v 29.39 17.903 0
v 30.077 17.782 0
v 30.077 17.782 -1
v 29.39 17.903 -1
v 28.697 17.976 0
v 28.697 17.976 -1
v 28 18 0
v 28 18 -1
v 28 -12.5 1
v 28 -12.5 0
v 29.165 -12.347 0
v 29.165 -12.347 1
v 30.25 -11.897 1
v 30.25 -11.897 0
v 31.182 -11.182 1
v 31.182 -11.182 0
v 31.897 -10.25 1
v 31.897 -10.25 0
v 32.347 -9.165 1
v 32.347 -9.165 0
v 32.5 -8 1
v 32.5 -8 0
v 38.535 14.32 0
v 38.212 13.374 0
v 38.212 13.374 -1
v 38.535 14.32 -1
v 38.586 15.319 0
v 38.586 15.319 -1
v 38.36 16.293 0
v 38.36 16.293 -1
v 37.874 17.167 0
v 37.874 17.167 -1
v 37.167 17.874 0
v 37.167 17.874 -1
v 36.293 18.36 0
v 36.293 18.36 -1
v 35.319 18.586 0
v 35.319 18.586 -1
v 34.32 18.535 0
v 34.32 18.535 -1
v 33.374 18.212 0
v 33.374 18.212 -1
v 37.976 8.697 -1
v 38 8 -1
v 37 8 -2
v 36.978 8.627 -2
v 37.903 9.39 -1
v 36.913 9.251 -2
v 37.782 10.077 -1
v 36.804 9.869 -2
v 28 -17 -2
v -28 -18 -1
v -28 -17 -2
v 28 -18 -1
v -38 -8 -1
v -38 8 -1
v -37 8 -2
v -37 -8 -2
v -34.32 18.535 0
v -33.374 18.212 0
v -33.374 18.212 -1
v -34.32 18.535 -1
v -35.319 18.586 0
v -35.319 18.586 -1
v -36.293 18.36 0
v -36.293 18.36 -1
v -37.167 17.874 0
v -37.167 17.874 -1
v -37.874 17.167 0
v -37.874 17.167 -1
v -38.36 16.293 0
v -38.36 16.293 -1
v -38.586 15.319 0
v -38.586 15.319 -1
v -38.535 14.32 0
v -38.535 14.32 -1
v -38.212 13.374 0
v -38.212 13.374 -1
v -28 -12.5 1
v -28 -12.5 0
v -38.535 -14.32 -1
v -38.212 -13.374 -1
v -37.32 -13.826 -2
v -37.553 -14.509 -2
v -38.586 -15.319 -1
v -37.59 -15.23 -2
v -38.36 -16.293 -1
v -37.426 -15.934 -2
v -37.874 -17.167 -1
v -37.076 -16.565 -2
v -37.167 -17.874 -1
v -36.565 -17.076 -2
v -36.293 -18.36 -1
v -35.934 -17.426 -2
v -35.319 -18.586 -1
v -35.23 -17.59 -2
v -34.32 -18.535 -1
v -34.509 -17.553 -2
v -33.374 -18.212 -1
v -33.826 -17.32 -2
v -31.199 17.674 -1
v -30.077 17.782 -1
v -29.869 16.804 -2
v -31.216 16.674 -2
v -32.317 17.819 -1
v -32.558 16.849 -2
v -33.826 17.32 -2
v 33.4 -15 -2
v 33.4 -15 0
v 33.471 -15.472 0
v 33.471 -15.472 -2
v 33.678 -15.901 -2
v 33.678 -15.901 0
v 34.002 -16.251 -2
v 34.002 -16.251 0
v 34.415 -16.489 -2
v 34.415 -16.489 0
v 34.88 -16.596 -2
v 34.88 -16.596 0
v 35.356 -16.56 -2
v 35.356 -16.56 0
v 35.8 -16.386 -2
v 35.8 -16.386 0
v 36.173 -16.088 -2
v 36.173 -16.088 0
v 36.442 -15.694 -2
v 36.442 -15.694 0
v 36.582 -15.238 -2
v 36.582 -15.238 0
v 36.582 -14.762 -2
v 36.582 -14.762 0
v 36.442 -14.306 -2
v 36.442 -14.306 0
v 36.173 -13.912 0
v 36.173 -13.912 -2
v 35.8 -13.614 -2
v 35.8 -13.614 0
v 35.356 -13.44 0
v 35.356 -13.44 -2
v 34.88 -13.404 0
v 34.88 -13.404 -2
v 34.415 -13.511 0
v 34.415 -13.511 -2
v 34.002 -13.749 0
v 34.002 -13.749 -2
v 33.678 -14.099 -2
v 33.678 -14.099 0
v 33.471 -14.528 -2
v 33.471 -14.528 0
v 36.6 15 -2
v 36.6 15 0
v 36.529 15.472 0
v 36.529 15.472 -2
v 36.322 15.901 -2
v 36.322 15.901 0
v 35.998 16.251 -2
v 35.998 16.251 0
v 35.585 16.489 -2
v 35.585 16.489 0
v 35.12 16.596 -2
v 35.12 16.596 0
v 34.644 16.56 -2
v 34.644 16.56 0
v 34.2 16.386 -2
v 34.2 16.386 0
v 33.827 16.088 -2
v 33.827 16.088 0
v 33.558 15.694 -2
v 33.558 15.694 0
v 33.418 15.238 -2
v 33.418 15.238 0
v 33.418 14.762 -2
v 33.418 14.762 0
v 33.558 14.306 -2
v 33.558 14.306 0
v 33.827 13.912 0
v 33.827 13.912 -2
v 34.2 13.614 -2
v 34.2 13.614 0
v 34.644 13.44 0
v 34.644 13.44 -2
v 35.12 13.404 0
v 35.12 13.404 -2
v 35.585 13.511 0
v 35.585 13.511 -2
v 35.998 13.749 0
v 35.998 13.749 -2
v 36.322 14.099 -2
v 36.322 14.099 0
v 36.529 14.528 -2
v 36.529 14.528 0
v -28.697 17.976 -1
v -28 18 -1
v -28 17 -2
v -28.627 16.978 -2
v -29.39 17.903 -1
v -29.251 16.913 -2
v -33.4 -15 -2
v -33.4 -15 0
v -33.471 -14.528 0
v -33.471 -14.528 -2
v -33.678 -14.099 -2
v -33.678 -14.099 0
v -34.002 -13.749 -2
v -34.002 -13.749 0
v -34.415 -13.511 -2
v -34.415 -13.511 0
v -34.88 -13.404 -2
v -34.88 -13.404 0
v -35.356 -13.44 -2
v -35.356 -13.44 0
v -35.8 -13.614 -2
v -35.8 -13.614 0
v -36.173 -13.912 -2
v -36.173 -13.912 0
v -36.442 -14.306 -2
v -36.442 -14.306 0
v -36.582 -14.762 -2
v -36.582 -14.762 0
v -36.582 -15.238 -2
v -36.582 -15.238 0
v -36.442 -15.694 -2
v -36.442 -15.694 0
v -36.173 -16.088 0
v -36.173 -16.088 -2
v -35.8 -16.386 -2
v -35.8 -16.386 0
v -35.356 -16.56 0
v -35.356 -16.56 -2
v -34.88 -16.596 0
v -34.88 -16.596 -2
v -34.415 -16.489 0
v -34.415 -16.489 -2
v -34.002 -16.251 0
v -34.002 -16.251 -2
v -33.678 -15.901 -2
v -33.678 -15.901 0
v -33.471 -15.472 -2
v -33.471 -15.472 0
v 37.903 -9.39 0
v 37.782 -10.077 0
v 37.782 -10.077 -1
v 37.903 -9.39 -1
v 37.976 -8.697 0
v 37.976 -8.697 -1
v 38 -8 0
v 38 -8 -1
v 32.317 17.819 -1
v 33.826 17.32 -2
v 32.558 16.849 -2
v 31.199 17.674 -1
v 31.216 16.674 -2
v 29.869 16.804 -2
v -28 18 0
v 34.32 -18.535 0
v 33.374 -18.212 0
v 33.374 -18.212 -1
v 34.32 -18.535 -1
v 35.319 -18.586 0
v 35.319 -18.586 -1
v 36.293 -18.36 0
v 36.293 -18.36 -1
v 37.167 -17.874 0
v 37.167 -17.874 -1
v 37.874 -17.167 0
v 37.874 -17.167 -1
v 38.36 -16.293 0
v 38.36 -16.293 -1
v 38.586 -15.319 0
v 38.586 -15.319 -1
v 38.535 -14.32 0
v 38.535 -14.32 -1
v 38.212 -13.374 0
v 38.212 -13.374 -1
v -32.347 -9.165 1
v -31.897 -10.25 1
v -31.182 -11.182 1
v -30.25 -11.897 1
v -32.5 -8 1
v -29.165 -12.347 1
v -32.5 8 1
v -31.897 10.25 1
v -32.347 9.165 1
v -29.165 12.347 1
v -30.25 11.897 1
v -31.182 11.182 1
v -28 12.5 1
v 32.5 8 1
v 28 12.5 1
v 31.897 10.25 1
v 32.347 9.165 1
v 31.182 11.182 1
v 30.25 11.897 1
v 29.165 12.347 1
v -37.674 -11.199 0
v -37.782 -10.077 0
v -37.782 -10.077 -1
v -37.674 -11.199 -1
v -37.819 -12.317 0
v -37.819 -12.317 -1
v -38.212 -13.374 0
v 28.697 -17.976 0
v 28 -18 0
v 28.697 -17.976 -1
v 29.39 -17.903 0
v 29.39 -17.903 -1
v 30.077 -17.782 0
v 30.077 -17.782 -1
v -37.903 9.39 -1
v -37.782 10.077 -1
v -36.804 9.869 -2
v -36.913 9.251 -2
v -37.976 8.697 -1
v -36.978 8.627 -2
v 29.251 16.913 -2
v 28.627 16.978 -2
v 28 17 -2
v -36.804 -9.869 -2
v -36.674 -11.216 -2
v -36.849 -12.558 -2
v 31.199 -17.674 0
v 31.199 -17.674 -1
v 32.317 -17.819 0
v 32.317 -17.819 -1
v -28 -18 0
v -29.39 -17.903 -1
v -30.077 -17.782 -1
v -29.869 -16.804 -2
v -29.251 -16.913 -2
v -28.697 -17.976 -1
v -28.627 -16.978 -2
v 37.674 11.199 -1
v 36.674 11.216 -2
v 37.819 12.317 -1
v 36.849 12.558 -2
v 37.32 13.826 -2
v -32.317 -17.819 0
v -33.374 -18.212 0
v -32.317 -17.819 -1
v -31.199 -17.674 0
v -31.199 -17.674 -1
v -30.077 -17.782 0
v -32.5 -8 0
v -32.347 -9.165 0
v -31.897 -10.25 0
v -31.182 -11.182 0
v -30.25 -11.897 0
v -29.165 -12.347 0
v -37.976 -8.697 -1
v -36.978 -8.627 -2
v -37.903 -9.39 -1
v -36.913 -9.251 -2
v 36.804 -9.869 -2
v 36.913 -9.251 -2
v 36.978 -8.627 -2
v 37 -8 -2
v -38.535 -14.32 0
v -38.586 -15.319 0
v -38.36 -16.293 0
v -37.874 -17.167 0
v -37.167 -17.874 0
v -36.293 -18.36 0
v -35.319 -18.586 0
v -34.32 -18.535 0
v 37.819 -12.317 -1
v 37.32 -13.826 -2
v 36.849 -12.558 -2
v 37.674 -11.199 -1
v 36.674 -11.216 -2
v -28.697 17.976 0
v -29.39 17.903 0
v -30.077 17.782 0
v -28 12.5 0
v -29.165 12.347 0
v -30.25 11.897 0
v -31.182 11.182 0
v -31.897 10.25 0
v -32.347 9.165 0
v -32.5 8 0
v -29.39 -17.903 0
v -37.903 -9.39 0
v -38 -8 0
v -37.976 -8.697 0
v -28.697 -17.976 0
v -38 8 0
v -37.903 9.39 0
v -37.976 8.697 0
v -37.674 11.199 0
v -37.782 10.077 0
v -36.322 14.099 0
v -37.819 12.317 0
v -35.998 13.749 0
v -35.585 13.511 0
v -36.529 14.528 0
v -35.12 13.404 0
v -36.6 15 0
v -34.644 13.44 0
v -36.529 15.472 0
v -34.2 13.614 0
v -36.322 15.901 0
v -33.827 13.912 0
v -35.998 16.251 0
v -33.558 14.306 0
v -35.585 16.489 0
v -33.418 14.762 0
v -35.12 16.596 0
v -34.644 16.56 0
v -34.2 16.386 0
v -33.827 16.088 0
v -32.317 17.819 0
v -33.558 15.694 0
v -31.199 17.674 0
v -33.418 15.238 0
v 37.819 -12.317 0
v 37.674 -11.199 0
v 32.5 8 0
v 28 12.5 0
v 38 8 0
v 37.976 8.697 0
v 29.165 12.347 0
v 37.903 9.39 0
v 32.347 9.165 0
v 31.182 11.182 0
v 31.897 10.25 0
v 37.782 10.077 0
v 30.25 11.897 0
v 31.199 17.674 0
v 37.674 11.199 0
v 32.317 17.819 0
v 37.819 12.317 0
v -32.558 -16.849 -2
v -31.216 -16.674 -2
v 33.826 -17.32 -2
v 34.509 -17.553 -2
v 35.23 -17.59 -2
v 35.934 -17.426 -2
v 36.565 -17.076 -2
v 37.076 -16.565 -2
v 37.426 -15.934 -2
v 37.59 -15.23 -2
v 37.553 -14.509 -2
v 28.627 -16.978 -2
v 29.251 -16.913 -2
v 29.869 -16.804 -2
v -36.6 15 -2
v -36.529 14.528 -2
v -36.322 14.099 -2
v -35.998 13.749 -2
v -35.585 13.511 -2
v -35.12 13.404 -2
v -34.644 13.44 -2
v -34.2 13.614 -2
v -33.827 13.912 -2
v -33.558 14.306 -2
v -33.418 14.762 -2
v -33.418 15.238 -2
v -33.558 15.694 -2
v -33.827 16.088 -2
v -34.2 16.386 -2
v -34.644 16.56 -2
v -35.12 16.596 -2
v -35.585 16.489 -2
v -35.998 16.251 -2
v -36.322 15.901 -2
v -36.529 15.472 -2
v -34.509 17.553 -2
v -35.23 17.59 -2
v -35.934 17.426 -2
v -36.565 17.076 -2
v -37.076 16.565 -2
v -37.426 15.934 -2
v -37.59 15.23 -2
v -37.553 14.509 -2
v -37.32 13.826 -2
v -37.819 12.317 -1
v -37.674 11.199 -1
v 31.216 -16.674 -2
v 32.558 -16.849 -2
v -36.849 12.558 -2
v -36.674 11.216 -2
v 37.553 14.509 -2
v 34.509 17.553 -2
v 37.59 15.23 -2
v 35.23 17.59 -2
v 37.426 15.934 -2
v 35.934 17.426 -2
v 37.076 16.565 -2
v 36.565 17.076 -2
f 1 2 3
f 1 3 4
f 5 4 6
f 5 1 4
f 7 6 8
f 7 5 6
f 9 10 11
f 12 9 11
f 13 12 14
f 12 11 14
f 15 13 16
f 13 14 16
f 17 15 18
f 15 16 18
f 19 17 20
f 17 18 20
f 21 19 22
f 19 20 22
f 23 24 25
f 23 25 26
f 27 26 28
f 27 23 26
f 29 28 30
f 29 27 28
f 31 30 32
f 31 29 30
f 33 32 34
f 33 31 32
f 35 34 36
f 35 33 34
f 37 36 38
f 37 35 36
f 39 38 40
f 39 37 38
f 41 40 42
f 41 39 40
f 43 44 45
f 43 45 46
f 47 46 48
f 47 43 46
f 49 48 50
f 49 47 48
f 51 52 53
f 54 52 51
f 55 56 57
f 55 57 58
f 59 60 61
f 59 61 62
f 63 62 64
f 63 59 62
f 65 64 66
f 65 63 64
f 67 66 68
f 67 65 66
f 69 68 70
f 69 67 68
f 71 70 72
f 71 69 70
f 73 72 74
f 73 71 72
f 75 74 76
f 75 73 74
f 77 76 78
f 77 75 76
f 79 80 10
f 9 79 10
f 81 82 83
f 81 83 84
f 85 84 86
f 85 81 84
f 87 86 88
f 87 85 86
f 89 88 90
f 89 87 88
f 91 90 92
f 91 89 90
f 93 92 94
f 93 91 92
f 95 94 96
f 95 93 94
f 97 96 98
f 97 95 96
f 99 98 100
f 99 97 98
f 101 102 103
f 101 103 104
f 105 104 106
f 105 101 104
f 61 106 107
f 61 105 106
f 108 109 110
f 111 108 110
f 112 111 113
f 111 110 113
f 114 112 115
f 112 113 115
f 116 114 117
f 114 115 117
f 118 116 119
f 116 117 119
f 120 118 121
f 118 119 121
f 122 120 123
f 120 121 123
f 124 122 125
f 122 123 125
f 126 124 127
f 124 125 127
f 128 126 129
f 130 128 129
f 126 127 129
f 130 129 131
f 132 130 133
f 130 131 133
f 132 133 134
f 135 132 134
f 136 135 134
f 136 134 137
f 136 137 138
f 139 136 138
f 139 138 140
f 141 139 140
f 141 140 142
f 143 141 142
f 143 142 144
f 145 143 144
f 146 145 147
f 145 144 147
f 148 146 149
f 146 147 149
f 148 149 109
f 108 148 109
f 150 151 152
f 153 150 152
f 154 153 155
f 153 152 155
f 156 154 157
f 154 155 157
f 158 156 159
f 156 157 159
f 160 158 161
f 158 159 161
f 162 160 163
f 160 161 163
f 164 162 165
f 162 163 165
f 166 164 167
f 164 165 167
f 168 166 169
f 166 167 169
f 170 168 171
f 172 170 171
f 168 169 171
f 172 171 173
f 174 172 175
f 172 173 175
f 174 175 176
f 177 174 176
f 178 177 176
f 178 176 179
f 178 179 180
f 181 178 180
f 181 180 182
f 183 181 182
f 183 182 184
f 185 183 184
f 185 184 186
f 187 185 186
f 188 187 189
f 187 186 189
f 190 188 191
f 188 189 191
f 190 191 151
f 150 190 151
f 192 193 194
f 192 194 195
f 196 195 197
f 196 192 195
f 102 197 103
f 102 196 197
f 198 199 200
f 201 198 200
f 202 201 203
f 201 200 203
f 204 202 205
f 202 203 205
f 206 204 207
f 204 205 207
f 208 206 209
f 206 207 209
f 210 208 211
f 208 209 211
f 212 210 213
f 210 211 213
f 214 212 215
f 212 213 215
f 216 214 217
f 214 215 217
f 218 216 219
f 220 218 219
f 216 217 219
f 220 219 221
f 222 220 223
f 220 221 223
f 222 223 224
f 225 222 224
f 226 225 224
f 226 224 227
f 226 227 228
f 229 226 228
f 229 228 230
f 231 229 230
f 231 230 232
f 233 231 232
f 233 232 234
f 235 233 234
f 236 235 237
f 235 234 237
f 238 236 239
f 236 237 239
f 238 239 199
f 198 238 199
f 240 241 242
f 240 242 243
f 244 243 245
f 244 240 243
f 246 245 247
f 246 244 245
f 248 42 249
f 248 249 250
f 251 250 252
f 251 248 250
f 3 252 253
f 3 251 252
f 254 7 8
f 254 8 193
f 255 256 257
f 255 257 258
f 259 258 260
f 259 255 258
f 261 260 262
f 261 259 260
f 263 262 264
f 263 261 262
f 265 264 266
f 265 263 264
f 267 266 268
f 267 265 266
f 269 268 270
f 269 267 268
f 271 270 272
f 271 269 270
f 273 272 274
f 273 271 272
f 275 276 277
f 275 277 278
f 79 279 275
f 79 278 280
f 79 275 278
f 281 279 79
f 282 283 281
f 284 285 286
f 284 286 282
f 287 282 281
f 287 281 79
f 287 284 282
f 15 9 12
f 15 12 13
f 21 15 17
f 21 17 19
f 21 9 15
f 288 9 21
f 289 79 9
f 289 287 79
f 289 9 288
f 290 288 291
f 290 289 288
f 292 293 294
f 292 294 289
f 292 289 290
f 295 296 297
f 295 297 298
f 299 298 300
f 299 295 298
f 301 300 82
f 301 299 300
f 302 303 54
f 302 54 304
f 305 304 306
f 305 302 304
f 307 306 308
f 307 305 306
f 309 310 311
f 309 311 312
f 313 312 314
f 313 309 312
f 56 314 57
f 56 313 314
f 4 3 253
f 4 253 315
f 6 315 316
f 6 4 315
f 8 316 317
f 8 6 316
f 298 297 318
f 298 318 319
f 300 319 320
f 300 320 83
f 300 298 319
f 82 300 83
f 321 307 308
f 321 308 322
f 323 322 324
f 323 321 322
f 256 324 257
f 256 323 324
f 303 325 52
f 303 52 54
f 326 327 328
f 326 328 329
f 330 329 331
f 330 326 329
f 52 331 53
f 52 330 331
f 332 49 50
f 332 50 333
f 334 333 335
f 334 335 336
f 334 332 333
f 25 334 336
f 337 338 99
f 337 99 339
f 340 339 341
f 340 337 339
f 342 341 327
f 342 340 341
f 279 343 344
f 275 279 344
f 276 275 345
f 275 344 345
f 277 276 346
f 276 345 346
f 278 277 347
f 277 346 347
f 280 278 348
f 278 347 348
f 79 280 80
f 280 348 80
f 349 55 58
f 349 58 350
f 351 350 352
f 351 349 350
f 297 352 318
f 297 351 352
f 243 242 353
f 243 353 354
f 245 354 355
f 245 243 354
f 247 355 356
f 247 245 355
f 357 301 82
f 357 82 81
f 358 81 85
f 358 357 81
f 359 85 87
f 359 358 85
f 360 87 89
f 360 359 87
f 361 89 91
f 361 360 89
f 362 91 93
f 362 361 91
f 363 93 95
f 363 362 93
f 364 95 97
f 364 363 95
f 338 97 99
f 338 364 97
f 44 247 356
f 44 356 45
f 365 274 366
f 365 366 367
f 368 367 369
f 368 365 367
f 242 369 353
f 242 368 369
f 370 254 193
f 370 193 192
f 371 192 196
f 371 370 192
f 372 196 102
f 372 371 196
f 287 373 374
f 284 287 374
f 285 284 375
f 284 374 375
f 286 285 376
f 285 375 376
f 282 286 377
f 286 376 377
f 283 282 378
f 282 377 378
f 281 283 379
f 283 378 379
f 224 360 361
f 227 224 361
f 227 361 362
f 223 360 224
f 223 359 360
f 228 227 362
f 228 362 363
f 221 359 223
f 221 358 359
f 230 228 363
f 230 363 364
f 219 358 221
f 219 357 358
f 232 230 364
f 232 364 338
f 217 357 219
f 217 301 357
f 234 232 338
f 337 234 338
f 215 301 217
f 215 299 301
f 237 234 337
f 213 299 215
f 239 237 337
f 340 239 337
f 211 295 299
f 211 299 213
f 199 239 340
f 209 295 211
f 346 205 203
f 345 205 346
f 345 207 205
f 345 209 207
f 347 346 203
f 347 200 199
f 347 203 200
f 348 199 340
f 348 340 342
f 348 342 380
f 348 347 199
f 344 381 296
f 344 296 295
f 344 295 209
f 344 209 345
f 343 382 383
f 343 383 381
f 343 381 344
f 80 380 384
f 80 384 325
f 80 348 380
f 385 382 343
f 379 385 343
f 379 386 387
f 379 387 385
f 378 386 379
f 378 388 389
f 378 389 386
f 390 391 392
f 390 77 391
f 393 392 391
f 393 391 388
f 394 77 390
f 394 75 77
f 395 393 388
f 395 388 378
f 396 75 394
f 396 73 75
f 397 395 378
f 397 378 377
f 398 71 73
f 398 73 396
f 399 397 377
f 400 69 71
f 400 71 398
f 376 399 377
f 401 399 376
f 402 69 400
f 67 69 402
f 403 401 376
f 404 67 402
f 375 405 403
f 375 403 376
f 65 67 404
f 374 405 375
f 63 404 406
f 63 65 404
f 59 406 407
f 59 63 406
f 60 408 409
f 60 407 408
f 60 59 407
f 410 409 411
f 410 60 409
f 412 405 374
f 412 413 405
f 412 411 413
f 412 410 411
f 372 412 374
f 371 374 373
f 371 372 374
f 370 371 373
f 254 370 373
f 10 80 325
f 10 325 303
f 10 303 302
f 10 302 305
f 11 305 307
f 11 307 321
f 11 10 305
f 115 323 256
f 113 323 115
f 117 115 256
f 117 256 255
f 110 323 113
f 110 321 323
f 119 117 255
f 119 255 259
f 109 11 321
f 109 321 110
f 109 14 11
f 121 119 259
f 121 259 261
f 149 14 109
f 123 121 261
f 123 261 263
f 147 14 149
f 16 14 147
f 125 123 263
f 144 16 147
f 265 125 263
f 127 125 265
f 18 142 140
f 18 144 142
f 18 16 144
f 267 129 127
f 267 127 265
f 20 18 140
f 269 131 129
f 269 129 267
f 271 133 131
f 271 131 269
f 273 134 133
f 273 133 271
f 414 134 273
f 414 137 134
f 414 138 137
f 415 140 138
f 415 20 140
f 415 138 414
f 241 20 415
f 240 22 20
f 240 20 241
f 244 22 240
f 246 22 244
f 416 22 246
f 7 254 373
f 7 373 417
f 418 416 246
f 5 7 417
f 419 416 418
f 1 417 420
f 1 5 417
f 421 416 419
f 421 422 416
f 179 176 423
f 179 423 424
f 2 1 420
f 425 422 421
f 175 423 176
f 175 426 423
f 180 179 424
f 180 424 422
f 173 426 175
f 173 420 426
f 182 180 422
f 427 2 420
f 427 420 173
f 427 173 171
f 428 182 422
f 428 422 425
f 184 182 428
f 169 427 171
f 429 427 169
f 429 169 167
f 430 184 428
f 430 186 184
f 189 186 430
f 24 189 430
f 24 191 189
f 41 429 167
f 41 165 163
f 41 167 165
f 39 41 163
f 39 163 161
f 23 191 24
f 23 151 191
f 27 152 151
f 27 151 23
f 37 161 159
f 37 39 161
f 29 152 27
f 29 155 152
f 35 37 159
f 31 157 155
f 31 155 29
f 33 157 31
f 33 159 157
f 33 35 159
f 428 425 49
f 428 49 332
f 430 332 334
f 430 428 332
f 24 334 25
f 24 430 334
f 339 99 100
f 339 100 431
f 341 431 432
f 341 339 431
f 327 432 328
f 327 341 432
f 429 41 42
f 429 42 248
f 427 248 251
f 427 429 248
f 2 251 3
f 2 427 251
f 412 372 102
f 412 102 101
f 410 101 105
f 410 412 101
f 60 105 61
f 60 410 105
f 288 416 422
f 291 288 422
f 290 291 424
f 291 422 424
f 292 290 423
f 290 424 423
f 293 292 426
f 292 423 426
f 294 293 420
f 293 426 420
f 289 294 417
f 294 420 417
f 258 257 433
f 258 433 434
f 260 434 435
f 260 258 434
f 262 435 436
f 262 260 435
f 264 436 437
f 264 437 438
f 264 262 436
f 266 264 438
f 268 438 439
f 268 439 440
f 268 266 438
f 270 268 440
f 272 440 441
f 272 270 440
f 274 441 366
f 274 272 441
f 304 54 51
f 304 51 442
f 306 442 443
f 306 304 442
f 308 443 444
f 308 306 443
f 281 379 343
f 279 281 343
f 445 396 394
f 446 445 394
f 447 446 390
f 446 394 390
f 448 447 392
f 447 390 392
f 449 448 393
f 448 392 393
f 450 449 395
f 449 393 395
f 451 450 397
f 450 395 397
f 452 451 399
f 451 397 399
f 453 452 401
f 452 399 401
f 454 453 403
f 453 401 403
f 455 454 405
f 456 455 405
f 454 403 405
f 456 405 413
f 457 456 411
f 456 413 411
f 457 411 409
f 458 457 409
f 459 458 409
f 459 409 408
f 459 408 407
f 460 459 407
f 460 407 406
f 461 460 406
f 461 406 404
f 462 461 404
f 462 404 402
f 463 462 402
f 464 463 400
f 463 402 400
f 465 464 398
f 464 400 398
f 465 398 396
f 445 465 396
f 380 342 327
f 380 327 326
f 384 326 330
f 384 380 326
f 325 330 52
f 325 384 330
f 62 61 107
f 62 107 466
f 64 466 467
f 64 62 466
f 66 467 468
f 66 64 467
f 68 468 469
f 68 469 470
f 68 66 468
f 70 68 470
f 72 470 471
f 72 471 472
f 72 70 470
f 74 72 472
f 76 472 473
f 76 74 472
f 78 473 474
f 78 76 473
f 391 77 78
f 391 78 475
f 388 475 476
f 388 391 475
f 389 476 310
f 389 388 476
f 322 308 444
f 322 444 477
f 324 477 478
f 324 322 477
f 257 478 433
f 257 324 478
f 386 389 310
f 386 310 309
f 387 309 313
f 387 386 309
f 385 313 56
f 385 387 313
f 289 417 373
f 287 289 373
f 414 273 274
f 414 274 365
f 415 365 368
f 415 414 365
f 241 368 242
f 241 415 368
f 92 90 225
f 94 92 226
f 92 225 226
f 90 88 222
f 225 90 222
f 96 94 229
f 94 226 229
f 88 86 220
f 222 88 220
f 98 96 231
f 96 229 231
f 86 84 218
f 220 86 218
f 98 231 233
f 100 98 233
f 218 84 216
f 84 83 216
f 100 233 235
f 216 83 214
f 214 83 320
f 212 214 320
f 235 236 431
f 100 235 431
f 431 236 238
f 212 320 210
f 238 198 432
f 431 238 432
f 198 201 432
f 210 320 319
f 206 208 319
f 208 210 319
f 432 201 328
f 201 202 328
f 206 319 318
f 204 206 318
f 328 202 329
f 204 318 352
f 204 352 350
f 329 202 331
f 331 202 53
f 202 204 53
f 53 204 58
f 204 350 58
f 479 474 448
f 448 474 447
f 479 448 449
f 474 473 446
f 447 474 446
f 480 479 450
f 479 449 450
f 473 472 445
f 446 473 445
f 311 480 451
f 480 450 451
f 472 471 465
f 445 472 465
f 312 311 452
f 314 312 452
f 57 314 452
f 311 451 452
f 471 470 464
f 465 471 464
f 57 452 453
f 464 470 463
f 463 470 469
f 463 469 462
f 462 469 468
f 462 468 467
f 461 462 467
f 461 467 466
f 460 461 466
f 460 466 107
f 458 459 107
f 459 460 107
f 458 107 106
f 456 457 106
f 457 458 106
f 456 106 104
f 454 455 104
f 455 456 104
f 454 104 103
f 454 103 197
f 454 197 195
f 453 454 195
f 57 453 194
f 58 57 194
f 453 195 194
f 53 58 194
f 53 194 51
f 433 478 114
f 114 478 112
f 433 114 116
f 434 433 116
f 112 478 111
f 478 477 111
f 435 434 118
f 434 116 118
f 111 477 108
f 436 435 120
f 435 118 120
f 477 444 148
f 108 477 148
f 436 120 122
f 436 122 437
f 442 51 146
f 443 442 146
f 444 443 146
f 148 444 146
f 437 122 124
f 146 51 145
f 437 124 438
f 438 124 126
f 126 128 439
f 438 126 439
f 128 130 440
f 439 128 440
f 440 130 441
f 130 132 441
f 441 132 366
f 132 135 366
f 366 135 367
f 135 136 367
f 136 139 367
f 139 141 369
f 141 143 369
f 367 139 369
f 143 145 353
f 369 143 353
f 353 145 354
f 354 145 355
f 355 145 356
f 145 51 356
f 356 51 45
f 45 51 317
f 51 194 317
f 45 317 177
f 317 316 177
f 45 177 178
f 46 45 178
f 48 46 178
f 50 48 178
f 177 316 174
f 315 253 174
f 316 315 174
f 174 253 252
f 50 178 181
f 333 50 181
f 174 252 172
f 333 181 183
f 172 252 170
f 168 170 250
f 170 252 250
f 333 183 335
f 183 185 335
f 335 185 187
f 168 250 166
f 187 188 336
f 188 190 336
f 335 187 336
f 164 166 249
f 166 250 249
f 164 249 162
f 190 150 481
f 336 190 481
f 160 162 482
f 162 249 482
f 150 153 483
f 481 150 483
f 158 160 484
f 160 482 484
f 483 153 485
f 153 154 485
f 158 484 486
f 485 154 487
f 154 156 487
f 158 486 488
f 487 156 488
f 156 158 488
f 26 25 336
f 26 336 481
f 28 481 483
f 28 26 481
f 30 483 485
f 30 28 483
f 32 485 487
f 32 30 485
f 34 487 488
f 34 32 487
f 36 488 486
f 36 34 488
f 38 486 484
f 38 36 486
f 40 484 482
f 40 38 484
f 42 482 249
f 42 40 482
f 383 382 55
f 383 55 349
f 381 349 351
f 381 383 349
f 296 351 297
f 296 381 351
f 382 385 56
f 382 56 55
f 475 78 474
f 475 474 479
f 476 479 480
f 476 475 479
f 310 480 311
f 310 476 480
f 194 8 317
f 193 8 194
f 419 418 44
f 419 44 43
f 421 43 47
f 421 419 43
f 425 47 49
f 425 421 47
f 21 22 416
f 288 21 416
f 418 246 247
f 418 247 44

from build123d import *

# Parameters (mm, degrees)
SKETCH1_R           = 1.6
BOSS_EXTRUDE1_DEPTH = 2
BOSS_EXTRUDE2_DEPTH = 1
CHAMFER1_SIZE       = 1


with BuildPart() as part:
    # Sketch1 → Boss-Extrude1 (new body)
    with BuildSketch(Plane.XY):
        with BuildLine():
            Line((38, -8), (38, 8))
            ThreePointArc((38, 8), (37.945323743, 9.044287145), (37.781892872, 10.077154747))
            ThreePointArc((37.781892872, 10.077154747), (37.714830787, 11.762378479), (38.211886222, 13.374027399))
            ThreePointArc((38.211886222, 13.374027399), (37.545584412, 17.545584412), (33.374027399, 18.211886222))
            ThreePointArc((33.374027399, 18.211886222), (31.762378479, 17.714830787), (30.077154747, 17.781892872))
            ThreePointArc((30.077154747, 17.781892872), (29.044287145, 17.945323743), (28, 18))
            Line((28, 18), (-28, 18))
            ThreePointArc((-28, 18), (-29.044287145, 17.945323743), (-30.077154747, 17.781892872))
            ThreePointArc((-30.077154747, 17.781892872), (-31.762378479, 17.714830787), (-33.374027399, 18.211886222))
            ThreePointArc((-33.374027399, 18.211886222), (-37.545584412, 17.545584412), (-38.211886222, 13.374027399))
            ThreePointArc((-38.211886222, 13.374027399), (-37.714830787, 11.762378479), (-37.781892872, 10.077154747))
            ThreePointArc((-37.781892872, 10.077154747), (-37.945323743, 9.044287145), (-38, 8))
            Line((-38, 8), (-38, -8))
            ThreePointArc((-38, -8), (-37.945323743, -9.044287145), (-37.781892872, -10.077154747))
            ThreePointArc((-37.781892872, -10.077154747), (-37.714830787, -11.762378479), (-38.211886222, -13.374027399))
            ThreePointArc((-38.211886222, -13.374027399), (-37.545584412, -17.545584412), (-33.374027399, -18.211886222))
            ThreePointArc((-33.374027399, -18.211886222), (-31.762378479, -17.714830787), (-30.077154747, -17.781892872))
            ThreePointArc((-30.077154747, -17.781892872), (-29.044287145, -17.945323743), (-28, -18))
            Line((-28, -18), (28, -18))
            ThreePointArc((28, -18), (29.044287145, -17.945323743), (30.077154747, -17.781892872))
            ThreePointArc((30.077154747, -17.781892872), (31.762378479, -17.714830787), (33.374027399, -18.211886222))
            ThreePointArc((33.374027399, -18.211886222), (37.545584412, -17.545584412), (38.211886222, -13.374027399))
            ThreePointArc((38.211886222, -13.374027399), (37.714830787, -11.762378479), (37.781892872, -10.077154747))
            ThreePointArc((37.781892872, -10.077154747), (37.945323743, -9.044287145), (38, -8))
        make_face()
        with Locations((35, 15)):
            Circle(SKETCH1_R, mode=Mode.SUBTRACT)
        with Locations((-35, 15)):
            Circle(SKETCH1_R, mode=Mode.SUBTRACT)
        with Locations((35, -15)):
            Circle(SKETCH1_R, mode=Mode.SUBTRACT)
        with Locations((-35, -15)):
            Circle(SKETCH1_R, mode=Mode.SUBTRACT)
    extrude(amount=-BOSS_EXTRUDE1_DEPTH)

    # Sketch1<3> → Boss-Extrude2 (add)
    with BuildSketch(Plane.XY):
        with BuildLine():
            ThreePointArc((28, -12.5), (31.181980515, -11.181980515), (32.5, -8))
            Line((32.5, -8), (32.5, 8))
            ThreePointArc((32.5, 8), (31.181980515, 11.181980515), (28, 12.5))
            Line((28, 12.5), (-28, 12.5))
            ThreePointArc((-28, 12.5), (-31.181980515, 11.181980515), (-32.5, 8))
            Line((-32.5, 8), (-32.5, -8))
            ThreePointArc((-32.5, -8), (-31.181980515, -11.181980515), (-28, -12.5))
            Line((-28, -12.5), (28, -12.5))
        make_face()
    extrude(amount=BOSS_EXTRUDE2_DEPTH)

    # Chamfer1
    chamfer1_edges = [part.edges().sort_by_distance(p)[0] for p in [
        (-38, 0, -2),
        (-37.945323743, -9.044287145, -2),
        (-37.945323743, 9.044287145, -2),
        (-37.714830787, -11.762378479, -2),
        (-37.714830787, 11.762378479, -2),
        (-37.545584412, -17.545584412, -2),
        (-37.545584412, 17.545584412, -2),
        (-31.762378479, -17.714830787, -2),
        (-31.762378479, 17.714830787, -2),
        (-29.044287145, -17.945323743, -2),
        (-29.044287145, 17.945323743, -2),
        (0, -18, -2),
        (0, 18, -2),
        (29.044287145, -17.945323743, -2),
        (29.044287145, 17.945323743, -2),
        (31.762378479, -17.714830787, -2),
        (31.762378479, 17.714830787, -2),
        (37.545584412, -17.545584412, -2),
        (37.545584412, 17.545584412, -2),
        (37.714830787, -11.762378479, -2),
        (37.714830787, 11.762378479, -2),
        (37.945323743, -9.044287145, -2),
        (37.945323743, 9.044287145, -2),
        (38, 0, -2),
    ]]
    chamfer(chamfer1_edges, length=CHAMFER1_SIZE)


solid = part.part
